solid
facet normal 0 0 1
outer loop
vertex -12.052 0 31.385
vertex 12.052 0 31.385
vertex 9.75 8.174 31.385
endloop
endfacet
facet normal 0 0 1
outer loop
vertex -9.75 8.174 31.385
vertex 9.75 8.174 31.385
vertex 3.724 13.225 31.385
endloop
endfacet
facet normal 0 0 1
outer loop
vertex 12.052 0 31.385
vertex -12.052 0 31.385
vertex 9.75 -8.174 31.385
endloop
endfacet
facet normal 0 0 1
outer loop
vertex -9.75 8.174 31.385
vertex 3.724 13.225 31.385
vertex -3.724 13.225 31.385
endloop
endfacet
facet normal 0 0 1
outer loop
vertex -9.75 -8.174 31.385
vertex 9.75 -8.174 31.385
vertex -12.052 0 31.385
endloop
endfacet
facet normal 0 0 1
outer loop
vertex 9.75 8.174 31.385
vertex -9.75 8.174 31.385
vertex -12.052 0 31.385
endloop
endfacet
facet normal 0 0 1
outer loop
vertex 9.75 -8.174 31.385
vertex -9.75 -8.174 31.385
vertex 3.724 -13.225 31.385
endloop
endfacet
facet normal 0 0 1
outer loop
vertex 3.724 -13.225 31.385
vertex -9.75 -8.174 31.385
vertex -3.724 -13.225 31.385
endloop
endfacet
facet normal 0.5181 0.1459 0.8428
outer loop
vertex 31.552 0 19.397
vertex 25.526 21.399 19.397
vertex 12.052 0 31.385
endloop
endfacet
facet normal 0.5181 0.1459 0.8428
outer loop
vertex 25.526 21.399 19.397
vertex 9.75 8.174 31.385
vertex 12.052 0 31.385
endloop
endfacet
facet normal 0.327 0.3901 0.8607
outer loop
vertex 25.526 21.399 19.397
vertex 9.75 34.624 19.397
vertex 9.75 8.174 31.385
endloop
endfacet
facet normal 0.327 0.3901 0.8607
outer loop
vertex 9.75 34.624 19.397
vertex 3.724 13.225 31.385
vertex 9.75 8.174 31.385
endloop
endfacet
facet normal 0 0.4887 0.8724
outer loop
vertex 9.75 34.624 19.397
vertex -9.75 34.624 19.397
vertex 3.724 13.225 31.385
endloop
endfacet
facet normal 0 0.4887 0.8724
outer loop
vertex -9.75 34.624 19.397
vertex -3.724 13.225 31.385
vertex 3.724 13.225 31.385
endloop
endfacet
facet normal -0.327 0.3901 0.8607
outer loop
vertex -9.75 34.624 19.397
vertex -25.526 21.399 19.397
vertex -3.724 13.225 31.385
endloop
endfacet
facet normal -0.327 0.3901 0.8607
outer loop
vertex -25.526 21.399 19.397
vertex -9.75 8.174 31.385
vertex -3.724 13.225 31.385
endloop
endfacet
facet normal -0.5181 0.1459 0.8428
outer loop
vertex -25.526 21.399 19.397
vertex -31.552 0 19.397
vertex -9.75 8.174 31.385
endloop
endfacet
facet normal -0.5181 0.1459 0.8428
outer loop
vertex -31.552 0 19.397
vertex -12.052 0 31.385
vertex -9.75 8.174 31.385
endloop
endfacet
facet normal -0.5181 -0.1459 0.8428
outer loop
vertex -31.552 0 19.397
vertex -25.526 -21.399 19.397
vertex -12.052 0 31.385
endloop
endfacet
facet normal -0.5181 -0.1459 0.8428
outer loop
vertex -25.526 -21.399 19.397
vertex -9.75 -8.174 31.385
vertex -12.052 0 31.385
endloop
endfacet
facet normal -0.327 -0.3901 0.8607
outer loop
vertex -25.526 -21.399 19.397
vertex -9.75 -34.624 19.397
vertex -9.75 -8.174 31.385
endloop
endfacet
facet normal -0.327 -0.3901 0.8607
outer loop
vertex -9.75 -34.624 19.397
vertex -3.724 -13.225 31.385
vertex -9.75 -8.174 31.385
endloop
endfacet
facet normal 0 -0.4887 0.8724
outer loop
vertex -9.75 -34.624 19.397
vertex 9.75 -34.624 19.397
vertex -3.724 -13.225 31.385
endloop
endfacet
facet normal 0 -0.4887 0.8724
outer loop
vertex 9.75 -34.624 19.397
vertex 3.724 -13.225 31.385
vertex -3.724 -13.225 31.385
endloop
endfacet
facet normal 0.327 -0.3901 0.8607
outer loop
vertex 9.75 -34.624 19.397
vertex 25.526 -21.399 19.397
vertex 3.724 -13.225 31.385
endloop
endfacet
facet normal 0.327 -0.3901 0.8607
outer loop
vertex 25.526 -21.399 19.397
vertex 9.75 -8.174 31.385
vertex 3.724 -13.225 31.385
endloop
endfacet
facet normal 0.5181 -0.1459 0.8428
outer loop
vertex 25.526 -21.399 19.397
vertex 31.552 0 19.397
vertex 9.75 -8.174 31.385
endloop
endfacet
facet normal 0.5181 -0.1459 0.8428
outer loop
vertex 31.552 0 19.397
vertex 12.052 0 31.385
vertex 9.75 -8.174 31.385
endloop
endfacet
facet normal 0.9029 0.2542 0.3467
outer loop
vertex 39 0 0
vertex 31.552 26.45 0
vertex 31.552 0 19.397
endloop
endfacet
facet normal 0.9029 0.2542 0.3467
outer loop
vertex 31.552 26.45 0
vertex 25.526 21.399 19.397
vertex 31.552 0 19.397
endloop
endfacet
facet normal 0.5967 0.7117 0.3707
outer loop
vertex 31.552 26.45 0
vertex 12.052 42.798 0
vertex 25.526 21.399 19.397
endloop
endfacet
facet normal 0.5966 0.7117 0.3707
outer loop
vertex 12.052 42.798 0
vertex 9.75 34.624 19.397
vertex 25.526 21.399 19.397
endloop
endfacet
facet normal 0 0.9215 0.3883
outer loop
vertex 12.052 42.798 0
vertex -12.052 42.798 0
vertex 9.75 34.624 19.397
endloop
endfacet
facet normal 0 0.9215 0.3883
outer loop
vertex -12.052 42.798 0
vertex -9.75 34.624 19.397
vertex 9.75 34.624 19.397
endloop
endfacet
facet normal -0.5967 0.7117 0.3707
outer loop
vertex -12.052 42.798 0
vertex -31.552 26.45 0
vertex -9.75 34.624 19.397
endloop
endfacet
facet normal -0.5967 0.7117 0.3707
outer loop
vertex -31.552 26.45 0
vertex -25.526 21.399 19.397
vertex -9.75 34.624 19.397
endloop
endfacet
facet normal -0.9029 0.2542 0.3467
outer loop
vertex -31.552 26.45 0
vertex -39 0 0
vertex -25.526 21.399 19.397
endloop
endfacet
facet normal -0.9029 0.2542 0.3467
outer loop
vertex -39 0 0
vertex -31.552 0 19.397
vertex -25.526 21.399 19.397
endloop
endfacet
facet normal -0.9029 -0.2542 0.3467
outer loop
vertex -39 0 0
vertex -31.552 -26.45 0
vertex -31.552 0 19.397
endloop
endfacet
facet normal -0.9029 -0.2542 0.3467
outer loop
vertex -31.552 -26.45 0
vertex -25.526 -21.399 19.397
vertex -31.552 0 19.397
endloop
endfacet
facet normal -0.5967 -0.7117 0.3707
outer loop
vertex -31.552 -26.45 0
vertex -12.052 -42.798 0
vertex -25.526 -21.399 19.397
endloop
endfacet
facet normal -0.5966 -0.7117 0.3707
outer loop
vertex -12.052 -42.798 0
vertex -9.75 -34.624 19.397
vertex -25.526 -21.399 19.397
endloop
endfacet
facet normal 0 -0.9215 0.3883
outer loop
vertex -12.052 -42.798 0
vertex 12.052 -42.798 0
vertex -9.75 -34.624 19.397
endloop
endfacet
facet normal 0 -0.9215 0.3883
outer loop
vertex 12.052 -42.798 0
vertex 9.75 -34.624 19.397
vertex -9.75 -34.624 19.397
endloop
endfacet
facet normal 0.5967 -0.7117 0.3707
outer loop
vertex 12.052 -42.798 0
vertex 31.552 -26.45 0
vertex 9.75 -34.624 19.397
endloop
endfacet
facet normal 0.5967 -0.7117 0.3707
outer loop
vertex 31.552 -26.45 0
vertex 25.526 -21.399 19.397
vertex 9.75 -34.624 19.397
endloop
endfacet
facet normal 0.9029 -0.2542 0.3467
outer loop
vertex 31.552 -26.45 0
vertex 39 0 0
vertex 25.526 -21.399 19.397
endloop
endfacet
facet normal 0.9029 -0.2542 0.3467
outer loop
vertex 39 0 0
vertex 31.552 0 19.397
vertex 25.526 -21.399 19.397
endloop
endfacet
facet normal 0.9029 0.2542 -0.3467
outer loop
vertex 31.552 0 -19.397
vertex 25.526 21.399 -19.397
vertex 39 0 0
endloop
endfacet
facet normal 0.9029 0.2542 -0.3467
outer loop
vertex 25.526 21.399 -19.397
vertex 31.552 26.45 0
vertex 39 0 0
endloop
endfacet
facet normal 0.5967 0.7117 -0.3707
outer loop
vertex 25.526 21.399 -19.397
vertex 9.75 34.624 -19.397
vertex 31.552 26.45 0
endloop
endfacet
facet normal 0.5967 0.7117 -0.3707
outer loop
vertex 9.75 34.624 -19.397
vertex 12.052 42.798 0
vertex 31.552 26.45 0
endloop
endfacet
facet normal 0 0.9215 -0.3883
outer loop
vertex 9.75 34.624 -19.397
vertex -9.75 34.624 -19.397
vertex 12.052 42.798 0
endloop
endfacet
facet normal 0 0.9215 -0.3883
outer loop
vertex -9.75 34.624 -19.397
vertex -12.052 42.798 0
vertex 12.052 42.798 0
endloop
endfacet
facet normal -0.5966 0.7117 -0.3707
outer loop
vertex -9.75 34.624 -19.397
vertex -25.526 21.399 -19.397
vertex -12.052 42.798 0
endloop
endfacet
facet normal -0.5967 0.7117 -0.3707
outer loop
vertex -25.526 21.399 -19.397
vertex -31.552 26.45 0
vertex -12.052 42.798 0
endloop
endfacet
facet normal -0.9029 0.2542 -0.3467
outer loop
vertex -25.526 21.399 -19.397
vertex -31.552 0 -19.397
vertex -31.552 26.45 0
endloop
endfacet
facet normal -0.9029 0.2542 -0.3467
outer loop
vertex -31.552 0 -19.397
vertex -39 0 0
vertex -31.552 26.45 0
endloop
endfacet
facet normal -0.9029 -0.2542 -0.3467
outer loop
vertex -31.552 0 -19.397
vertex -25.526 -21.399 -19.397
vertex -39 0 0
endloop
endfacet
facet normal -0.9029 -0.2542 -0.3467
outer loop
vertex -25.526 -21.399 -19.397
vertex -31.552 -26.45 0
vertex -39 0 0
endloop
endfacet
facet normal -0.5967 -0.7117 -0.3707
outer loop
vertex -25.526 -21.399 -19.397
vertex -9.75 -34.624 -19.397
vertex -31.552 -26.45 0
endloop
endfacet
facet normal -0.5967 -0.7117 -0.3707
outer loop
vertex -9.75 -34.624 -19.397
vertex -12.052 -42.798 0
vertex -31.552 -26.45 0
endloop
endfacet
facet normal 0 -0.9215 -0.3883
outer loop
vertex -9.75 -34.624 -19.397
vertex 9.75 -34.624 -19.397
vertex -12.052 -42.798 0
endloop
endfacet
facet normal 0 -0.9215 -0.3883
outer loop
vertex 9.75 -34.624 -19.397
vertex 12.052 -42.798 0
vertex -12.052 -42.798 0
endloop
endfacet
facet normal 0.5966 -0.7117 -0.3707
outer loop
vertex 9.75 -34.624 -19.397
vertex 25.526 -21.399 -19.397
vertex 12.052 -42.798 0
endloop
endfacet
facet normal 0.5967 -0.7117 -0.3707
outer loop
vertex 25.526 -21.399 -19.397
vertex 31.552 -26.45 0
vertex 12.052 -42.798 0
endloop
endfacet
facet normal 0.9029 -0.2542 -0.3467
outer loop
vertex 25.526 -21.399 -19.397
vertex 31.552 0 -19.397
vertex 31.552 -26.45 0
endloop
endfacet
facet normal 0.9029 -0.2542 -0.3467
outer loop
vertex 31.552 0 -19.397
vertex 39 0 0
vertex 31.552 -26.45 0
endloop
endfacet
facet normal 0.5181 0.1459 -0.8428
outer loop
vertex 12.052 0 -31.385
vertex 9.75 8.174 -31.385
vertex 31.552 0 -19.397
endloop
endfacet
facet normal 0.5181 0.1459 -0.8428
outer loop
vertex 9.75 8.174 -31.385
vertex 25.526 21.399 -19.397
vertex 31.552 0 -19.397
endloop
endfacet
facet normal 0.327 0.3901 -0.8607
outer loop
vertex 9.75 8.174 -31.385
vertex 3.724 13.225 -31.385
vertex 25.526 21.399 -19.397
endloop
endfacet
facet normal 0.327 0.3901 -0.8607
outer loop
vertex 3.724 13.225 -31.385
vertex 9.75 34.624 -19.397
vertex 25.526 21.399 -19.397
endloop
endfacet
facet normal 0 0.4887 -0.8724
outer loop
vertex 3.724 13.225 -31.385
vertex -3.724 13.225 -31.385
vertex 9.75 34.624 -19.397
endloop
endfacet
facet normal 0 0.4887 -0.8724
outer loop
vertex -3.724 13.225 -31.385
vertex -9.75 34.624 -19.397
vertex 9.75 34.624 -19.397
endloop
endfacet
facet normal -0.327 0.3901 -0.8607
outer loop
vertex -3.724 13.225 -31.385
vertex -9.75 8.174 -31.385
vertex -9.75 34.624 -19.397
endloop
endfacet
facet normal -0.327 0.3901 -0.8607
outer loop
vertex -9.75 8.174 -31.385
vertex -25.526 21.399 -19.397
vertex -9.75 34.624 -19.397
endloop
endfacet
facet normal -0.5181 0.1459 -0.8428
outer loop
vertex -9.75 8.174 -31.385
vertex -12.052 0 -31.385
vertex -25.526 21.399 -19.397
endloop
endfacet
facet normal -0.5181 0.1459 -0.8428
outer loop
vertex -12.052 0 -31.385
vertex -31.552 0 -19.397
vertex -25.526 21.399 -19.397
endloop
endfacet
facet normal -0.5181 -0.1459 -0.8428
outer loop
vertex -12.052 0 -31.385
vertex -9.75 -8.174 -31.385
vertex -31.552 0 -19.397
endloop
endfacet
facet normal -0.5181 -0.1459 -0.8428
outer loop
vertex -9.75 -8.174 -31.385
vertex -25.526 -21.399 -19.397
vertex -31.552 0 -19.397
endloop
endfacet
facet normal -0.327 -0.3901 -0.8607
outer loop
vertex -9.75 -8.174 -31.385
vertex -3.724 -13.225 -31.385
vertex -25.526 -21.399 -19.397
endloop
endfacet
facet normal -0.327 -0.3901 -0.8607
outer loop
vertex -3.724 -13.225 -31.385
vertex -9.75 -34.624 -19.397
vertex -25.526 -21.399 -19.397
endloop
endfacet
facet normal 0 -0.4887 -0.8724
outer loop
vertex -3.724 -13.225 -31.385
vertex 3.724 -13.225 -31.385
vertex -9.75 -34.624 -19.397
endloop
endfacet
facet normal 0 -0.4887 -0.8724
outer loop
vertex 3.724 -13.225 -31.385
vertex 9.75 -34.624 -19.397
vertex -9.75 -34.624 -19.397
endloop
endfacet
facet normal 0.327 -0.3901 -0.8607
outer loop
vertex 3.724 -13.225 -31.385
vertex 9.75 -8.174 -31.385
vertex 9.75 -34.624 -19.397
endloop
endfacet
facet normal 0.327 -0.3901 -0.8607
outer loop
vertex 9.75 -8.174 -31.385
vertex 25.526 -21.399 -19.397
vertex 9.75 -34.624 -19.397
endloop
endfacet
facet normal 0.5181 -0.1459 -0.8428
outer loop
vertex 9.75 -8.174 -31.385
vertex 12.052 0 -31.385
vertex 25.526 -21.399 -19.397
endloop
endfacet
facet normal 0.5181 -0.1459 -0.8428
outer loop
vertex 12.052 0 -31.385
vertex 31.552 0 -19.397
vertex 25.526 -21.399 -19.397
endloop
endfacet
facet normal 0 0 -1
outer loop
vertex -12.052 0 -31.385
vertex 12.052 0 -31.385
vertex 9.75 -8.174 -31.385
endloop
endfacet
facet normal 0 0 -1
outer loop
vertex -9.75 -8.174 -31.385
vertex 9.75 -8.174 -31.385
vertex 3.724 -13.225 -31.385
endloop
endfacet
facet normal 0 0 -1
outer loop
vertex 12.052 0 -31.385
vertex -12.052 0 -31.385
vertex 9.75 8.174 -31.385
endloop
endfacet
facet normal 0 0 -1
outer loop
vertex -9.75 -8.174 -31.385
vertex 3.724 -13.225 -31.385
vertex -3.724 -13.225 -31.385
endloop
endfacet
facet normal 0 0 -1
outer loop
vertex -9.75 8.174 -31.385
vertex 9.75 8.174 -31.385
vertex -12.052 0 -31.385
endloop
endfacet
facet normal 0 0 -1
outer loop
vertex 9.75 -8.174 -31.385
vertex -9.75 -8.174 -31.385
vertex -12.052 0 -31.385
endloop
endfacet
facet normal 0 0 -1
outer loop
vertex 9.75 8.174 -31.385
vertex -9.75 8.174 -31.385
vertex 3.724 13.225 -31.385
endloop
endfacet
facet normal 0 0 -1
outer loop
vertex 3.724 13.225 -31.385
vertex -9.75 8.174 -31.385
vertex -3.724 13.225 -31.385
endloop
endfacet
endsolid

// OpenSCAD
// Generated by SolidPython 1.0.1 on 2020-07-29 00:46:51


scale(v = [13, 15, 11]) {
	sphere(r = 3);
}
/***********************************************
*********      SolidPython code:      **********
************************************************
 
# import packages: SolidPython
from solid import *
from solid.utils import *
from itertools import chain, combinations, permutations


class Resize:

    def __init__(self, scad_file):
        self.scad_file = scad_file
        #self.scad_file = import_scad(scad_file)
        # cone/cylinder param:
        self.r1 = 0
        self.r2 = 0
        self.h = 0
        # rectangular prism param:
        self.w = 0
        self.l = 0
        # ellipse param:
        self.r = 0

    # import OpenScad code (file name corresponds to shape)


    # classify shape + parameters
    def assign(self, param1, param2, param3):
        if self.scad_file == 'cone.scad':
            self.r1 = param1
            self.r2 = param2
            self.h = param3
        elif self.scad_file == 'cylinder.scad':
            self.r1 = param1
            self.r2 = param2
            self.h = param3
        elif self.scad_file == 'rectangularPrism.scad':
            self.h = param1
            self.l = param2
            self.w = param3
        else:
            self.r = param1
            self.h = param2

    # resize parameters
    def iterate(self):
        x = range(3, 20, 2)
        i = 1
        if self.scad_file == 'cone.scad':
            tempList = list(permutations(x, 2))
            for temp in tempList:
                param1 = temp[0]
                param2 = temp[1]
                filepath = 'produced_scad_files/' + 'cone' + str(param1) + '_' + str(param2) + '_' + '.scad'
                scad_render_to_file(cylinder(h=param1, r1=param2, r2=0), filepath)

        elif self.scad_file == 'cylinder.scad':
            tempList = list(permutations(x, 3))
            for temp in tempList:
                param1 = temp[0]
                param2 = temp[1]
                filepath = 'produced_scad_files/' + 'cylinder' + str(param1) + '_' + str(param2) + '_' + '.scad'
                scad_render_to_file(cylinder(h=param1, r1=param2, r2=param2), filepath)

        elif self.scad_file == 'rectangularPrism.scad':
            tempList = list(permutations(x, 3))
            for temp in tempList:
                param1 = temp[0]
                param2 = temp[1]
                param3 = temp[2]
                filepath = 'produced_scad_files/' + 'rectangularPrism' + str(param1) + '_' + str(param2) + '_' + str(
                    param3) + '.scad'
                scad_render_to_file(cube(size=(param1, param2, param3)), filepath)

        elif self.scad_file == 'ellipse.scad':
            tempList = list(permutations(x, 4))
            for temp in tempList:
                param1 = temp[0]
                param2 = temp[1]
                param3 = temp[2]
                param4 = temp[3]
                filepath = 'produced_scad_files/' + 'ellipse' + str(param1) + '_' + str(param2) + '_' + str(param3) + '_' + str(param4) + '.scad'
                scad_render_to_file(scale([param1, param2, param3])(sphere(r=param4)), filepath)

    def render_to_scadfile(self):
        scad_render_to_file(scad, 'example.scad') 
 
************************************************/
